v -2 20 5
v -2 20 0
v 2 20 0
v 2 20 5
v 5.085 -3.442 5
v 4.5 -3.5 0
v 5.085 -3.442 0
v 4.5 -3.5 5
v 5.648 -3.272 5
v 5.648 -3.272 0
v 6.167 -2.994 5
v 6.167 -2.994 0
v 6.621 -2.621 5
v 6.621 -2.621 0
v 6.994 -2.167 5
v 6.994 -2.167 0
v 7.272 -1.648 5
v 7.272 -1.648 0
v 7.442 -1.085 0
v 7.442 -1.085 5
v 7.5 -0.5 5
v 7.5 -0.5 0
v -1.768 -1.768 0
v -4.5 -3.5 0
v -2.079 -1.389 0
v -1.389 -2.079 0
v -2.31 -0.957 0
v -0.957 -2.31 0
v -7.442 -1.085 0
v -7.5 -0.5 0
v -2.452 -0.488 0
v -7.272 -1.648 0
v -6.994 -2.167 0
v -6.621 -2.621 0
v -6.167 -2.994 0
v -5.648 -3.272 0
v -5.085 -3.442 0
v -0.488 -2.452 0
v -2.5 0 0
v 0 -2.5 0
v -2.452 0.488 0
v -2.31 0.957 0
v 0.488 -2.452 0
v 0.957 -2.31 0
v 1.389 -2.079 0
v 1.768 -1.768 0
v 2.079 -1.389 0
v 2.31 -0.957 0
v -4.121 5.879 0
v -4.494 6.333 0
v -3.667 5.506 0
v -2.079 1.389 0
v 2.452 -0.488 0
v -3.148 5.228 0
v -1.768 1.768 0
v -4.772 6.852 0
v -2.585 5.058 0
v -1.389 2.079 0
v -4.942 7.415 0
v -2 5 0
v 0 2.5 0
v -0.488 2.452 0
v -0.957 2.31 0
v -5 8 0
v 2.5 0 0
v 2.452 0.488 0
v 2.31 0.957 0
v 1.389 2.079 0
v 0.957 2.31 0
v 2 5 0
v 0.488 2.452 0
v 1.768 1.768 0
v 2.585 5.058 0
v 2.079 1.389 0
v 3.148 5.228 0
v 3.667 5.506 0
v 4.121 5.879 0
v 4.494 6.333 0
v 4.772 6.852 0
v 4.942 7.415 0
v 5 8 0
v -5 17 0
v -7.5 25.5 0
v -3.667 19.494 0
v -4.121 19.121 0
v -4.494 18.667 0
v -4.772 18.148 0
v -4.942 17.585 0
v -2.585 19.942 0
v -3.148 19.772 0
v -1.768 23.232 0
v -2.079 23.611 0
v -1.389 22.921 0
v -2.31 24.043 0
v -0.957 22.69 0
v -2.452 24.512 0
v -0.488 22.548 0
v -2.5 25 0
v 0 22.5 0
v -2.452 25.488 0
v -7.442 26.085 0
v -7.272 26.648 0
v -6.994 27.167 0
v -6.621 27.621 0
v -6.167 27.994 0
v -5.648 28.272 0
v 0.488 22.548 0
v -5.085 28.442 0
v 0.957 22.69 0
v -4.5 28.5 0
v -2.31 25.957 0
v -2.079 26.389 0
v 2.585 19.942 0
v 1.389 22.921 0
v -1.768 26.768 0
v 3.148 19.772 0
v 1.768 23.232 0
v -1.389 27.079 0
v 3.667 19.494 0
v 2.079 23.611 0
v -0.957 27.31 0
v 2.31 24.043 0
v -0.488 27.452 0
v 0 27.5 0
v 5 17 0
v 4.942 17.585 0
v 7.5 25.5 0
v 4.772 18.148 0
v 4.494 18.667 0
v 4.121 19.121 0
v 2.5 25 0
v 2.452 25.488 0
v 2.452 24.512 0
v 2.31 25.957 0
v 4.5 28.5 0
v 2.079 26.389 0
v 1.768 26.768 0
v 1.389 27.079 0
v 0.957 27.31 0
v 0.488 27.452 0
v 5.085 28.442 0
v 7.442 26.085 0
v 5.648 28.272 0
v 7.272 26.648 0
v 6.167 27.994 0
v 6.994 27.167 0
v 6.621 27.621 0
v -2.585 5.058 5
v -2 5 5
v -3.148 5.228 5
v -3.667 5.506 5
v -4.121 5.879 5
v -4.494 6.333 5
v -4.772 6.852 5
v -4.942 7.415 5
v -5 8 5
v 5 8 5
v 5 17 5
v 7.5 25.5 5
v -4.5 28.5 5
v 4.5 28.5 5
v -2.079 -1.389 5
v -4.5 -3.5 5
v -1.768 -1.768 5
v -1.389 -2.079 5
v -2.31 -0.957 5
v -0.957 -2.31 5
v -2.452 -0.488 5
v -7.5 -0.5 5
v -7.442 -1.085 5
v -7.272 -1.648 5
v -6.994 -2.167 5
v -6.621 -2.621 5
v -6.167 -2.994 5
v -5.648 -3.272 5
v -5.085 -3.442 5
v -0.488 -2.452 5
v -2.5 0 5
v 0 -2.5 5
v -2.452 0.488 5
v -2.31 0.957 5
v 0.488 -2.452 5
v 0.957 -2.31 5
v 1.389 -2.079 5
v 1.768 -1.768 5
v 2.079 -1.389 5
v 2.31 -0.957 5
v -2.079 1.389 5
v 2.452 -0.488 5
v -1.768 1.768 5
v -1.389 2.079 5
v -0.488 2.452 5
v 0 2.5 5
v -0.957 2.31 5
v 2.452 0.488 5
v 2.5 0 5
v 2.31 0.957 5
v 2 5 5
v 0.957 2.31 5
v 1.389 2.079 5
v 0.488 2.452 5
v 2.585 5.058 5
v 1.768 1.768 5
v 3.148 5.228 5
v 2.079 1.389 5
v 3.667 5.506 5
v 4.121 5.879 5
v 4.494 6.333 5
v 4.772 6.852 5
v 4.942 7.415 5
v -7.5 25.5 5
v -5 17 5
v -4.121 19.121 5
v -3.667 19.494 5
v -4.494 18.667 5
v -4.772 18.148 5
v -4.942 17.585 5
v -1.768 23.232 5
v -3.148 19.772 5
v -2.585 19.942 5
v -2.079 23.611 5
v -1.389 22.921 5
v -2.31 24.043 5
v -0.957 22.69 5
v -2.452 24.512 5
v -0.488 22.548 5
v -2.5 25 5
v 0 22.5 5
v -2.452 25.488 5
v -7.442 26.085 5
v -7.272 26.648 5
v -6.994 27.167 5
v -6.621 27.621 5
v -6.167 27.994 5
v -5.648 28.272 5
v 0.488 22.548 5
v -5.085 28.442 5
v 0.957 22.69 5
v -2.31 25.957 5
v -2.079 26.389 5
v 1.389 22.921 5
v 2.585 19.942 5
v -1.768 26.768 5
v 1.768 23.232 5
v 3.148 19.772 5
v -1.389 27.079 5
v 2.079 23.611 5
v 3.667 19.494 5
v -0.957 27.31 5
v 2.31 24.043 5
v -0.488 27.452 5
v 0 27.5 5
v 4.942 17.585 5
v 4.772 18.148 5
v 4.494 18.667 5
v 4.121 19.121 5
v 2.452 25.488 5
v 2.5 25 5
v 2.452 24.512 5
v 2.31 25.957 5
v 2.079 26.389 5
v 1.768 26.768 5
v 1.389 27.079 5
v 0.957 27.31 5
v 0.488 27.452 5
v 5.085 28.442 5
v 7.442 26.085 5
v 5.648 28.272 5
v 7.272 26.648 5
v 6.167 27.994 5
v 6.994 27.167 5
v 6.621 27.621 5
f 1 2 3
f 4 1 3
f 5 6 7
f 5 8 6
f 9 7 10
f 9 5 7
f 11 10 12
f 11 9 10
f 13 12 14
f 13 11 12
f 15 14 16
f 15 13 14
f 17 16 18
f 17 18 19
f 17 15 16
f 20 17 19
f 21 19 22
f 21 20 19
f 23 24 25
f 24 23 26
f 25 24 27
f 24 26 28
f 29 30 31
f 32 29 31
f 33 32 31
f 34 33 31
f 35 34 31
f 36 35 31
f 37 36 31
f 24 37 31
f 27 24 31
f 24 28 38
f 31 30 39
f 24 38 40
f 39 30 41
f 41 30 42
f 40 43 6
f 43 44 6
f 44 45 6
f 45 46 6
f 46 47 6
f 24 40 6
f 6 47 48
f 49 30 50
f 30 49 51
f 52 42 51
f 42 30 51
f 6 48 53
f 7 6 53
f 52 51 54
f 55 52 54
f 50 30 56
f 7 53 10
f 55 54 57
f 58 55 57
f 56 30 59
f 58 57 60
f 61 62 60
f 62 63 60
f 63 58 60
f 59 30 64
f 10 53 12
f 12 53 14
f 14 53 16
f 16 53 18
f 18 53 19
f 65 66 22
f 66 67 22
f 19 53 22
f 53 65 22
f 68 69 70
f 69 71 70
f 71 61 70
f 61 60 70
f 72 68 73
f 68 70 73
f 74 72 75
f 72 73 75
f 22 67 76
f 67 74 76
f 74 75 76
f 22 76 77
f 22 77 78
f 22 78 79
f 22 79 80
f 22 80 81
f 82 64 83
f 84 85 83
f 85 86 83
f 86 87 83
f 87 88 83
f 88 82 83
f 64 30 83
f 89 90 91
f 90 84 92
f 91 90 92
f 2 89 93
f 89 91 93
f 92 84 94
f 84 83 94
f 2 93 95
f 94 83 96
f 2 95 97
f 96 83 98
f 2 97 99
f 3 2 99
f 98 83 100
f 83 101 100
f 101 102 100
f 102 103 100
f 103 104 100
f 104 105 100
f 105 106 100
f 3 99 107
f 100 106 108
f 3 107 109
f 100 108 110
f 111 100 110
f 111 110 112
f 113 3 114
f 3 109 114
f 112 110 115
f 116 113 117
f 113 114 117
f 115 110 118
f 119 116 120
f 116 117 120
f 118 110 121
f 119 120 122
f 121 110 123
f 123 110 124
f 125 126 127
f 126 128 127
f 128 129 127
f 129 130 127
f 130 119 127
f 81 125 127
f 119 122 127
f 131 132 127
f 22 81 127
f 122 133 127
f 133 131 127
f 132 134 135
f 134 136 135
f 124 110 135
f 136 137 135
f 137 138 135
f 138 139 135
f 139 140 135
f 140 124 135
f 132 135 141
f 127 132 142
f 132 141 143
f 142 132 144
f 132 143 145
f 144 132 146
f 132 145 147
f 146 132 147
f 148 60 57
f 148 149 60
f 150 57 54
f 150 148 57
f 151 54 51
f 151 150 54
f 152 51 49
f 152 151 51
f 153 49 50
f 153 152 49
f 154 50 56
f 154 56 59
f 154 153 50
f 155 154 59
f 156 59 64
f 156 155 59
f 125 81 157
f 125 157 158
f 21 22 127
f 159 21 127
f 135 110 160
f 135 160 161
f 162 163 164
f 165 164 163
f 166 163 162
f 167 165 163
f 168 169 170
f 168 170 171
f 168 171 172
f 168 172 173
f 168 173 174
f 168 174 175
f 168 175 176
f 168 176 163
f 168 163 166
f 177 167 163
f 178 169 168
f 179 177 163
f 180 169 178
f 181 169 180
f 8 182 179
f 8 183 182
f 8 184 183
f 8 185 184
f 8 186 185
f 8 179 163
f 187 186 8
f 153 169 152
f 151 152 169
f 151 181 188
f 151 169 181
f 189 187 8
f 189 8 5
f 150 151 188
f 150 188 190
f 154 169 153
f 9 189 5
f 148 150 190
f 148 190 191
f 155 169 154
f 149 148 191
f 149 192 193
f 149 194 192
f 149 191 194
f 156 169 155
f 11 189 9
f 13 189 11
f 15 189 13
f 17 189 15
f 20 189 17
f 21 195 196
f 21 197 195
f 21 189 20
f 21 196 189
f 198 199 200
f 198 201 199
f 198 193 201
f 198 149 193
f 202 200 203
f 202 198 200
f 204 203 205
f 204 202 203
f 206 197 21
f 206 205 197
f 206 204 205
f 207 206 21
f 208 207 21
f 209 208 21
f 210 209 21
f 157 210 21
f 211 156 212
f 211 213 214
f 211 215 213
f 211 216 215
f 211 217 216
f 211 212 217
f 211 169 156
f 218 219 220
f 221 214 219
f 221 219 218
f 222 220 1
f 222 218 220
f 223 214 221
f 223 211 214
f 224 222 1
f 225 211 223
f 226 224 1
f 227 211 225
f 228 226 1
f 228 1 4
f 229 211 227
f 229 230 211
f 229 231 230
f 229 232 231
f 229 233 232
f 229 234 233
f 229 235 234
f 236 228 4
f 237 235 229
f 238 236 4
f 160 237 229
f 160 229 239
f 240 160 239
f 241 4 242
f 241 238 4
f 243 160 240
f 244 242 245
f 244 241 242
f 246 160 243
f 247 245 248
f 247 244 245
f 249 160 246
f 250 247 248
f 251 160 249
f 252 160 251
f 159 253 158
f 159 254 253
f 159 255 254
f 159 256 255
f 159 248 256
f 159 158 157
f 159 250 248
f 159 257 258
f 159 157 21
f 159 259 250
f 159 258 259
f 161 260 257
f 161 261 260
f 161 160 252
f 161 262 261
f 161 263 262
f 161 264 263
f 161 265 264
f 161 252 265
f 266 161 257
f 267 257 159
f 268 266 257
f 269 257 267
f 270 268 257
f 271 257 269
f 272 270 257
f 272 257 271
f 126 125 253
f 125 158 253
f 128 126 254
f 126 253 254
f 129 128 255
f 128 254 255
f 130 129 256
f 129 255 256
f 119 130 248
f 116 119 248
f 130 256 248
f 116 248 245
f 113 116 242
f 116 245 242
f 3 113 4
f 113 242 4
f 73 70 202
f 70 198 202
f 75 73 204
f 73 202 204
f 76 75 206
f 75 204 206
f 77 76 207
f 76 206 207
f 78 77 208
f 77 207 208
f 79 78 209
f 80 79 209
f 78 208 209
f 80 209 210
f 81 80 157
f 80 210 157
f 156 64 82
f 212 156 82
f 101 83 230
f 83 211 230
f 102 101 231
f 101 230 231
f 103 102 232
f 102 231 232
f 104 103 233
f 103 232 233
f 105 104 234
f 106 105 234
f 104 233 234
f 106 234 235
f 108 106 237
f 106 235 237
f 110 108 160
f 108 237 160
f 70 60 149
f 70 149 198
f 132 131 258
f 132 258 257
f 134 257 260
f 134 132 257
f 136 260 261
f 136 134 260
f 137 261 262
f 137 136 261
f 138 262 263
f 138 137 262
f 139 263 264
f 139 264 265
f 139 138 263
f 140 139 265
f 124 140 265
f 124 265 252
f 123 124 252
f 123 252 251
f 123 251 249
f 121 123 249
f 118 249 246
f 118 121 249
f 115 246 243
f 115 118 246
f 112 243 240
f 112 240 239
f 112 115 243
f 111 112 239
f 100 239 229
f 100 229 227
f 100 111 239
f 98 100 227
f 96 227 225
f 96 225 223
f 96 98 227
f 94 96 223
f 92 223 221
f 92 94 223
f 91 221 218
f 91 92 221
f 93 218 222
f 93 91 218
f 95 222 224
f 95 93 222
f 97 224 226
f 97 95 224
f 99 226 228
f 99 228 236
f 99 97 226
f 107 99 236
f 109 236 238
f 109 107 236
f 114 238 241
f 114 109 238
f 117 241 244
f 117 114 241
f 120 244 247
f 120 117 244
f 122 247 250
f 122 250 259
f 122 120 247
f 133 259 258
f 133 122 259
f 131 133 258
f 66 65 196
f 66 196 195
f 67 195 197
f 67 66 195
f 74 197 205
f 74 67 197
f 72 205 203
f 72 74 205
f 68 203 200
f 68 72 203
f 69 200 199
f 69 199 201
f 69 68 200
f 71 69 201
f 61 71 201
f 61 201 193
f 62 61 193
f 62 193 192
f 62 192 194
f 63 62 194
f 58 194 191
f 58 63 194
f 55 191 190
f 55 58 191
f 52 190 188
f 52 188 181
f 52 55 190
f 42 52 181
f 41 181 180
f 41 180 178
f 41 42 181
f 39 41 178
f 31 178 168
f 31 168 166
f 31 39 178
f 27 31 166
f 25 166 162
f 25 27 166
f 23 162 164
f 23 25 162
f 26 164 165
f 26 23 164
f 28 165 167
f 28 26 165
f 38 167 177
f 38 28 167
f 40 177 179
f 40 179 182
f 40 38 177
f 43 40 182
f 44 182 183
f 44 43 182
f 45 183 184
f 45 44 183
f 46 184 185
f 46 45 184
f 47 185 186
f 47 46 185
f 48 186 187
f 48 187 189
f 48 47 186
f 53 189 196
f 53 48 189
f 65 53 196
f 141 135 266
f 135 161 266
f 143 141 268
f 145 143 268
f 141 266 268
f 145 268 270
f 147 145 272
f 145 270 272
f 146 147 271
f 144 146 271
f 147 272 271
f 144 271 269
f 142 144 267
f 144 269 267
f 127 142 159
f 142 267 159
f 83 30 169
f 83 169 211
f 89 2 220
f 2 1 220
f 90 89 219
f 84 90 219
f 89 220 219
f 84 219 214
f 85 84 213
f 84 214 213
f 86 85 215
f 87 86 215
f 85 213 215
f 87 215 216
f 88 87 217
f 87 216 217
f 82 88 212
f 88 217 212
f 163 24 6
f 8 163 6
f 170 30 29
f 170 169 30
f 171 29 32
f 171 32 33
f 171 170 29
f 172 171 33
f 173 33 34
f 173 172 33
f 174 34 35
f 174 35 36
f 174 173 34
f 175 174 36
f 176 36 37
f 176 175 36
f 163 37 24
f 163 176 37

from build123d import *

# Parameters (mm, degrees)
SKETCH_1_W      = 15
SKETCH_1_H      = 32
SKETCH_1_R      = 2.5
SKETCH_1_W_2    = 10
SKETCH_1_H_2    = 15
EXTRUDE_1_DEPTH = 5
FILLET_1_R      = 3


with BuildPart() as part:
    # 草图1 → 凸台-拉伸1 (new body)
    with BuildSketch(Plane.XY):
        with Locations((0, 12.5)):
            Rectangle(SKETCH_1_W, SKETCH_1_H)
        with Locations((0, 25)):
            Circle(SKETCH_1_R, mode=Mode.SUBTRACT)
        Circle(SKETCH_1_R, mode=Mode.SUBTRACT)
        with Locations((0, 12.5)):
            Rectangle(SKETCH_1_W_2, SKETCH_1_H_2, mode=Mode.SUBTRACT)
    extrude(amount=EXTRUDE_1_DEPTH)

    # 圆角1
    fillet_1_edges = [part.edges().sort_by_distance(p)[0] for p in [
        (5, 5, 2.5),
        (5, 20, 2.5),
        (-5, 20, 2.5),
        (-5, 5, 2.5),
        (7.5, -3.5, 2.5),
        (-7.5, -3.5, 2.5),
        (-7.5, 28.5, 2.5),
        (7.5, 28.5, 2.5),
    ]]
    fillet(fillet_1_edges, radius=FILLET_1_R)


solid = part.part
